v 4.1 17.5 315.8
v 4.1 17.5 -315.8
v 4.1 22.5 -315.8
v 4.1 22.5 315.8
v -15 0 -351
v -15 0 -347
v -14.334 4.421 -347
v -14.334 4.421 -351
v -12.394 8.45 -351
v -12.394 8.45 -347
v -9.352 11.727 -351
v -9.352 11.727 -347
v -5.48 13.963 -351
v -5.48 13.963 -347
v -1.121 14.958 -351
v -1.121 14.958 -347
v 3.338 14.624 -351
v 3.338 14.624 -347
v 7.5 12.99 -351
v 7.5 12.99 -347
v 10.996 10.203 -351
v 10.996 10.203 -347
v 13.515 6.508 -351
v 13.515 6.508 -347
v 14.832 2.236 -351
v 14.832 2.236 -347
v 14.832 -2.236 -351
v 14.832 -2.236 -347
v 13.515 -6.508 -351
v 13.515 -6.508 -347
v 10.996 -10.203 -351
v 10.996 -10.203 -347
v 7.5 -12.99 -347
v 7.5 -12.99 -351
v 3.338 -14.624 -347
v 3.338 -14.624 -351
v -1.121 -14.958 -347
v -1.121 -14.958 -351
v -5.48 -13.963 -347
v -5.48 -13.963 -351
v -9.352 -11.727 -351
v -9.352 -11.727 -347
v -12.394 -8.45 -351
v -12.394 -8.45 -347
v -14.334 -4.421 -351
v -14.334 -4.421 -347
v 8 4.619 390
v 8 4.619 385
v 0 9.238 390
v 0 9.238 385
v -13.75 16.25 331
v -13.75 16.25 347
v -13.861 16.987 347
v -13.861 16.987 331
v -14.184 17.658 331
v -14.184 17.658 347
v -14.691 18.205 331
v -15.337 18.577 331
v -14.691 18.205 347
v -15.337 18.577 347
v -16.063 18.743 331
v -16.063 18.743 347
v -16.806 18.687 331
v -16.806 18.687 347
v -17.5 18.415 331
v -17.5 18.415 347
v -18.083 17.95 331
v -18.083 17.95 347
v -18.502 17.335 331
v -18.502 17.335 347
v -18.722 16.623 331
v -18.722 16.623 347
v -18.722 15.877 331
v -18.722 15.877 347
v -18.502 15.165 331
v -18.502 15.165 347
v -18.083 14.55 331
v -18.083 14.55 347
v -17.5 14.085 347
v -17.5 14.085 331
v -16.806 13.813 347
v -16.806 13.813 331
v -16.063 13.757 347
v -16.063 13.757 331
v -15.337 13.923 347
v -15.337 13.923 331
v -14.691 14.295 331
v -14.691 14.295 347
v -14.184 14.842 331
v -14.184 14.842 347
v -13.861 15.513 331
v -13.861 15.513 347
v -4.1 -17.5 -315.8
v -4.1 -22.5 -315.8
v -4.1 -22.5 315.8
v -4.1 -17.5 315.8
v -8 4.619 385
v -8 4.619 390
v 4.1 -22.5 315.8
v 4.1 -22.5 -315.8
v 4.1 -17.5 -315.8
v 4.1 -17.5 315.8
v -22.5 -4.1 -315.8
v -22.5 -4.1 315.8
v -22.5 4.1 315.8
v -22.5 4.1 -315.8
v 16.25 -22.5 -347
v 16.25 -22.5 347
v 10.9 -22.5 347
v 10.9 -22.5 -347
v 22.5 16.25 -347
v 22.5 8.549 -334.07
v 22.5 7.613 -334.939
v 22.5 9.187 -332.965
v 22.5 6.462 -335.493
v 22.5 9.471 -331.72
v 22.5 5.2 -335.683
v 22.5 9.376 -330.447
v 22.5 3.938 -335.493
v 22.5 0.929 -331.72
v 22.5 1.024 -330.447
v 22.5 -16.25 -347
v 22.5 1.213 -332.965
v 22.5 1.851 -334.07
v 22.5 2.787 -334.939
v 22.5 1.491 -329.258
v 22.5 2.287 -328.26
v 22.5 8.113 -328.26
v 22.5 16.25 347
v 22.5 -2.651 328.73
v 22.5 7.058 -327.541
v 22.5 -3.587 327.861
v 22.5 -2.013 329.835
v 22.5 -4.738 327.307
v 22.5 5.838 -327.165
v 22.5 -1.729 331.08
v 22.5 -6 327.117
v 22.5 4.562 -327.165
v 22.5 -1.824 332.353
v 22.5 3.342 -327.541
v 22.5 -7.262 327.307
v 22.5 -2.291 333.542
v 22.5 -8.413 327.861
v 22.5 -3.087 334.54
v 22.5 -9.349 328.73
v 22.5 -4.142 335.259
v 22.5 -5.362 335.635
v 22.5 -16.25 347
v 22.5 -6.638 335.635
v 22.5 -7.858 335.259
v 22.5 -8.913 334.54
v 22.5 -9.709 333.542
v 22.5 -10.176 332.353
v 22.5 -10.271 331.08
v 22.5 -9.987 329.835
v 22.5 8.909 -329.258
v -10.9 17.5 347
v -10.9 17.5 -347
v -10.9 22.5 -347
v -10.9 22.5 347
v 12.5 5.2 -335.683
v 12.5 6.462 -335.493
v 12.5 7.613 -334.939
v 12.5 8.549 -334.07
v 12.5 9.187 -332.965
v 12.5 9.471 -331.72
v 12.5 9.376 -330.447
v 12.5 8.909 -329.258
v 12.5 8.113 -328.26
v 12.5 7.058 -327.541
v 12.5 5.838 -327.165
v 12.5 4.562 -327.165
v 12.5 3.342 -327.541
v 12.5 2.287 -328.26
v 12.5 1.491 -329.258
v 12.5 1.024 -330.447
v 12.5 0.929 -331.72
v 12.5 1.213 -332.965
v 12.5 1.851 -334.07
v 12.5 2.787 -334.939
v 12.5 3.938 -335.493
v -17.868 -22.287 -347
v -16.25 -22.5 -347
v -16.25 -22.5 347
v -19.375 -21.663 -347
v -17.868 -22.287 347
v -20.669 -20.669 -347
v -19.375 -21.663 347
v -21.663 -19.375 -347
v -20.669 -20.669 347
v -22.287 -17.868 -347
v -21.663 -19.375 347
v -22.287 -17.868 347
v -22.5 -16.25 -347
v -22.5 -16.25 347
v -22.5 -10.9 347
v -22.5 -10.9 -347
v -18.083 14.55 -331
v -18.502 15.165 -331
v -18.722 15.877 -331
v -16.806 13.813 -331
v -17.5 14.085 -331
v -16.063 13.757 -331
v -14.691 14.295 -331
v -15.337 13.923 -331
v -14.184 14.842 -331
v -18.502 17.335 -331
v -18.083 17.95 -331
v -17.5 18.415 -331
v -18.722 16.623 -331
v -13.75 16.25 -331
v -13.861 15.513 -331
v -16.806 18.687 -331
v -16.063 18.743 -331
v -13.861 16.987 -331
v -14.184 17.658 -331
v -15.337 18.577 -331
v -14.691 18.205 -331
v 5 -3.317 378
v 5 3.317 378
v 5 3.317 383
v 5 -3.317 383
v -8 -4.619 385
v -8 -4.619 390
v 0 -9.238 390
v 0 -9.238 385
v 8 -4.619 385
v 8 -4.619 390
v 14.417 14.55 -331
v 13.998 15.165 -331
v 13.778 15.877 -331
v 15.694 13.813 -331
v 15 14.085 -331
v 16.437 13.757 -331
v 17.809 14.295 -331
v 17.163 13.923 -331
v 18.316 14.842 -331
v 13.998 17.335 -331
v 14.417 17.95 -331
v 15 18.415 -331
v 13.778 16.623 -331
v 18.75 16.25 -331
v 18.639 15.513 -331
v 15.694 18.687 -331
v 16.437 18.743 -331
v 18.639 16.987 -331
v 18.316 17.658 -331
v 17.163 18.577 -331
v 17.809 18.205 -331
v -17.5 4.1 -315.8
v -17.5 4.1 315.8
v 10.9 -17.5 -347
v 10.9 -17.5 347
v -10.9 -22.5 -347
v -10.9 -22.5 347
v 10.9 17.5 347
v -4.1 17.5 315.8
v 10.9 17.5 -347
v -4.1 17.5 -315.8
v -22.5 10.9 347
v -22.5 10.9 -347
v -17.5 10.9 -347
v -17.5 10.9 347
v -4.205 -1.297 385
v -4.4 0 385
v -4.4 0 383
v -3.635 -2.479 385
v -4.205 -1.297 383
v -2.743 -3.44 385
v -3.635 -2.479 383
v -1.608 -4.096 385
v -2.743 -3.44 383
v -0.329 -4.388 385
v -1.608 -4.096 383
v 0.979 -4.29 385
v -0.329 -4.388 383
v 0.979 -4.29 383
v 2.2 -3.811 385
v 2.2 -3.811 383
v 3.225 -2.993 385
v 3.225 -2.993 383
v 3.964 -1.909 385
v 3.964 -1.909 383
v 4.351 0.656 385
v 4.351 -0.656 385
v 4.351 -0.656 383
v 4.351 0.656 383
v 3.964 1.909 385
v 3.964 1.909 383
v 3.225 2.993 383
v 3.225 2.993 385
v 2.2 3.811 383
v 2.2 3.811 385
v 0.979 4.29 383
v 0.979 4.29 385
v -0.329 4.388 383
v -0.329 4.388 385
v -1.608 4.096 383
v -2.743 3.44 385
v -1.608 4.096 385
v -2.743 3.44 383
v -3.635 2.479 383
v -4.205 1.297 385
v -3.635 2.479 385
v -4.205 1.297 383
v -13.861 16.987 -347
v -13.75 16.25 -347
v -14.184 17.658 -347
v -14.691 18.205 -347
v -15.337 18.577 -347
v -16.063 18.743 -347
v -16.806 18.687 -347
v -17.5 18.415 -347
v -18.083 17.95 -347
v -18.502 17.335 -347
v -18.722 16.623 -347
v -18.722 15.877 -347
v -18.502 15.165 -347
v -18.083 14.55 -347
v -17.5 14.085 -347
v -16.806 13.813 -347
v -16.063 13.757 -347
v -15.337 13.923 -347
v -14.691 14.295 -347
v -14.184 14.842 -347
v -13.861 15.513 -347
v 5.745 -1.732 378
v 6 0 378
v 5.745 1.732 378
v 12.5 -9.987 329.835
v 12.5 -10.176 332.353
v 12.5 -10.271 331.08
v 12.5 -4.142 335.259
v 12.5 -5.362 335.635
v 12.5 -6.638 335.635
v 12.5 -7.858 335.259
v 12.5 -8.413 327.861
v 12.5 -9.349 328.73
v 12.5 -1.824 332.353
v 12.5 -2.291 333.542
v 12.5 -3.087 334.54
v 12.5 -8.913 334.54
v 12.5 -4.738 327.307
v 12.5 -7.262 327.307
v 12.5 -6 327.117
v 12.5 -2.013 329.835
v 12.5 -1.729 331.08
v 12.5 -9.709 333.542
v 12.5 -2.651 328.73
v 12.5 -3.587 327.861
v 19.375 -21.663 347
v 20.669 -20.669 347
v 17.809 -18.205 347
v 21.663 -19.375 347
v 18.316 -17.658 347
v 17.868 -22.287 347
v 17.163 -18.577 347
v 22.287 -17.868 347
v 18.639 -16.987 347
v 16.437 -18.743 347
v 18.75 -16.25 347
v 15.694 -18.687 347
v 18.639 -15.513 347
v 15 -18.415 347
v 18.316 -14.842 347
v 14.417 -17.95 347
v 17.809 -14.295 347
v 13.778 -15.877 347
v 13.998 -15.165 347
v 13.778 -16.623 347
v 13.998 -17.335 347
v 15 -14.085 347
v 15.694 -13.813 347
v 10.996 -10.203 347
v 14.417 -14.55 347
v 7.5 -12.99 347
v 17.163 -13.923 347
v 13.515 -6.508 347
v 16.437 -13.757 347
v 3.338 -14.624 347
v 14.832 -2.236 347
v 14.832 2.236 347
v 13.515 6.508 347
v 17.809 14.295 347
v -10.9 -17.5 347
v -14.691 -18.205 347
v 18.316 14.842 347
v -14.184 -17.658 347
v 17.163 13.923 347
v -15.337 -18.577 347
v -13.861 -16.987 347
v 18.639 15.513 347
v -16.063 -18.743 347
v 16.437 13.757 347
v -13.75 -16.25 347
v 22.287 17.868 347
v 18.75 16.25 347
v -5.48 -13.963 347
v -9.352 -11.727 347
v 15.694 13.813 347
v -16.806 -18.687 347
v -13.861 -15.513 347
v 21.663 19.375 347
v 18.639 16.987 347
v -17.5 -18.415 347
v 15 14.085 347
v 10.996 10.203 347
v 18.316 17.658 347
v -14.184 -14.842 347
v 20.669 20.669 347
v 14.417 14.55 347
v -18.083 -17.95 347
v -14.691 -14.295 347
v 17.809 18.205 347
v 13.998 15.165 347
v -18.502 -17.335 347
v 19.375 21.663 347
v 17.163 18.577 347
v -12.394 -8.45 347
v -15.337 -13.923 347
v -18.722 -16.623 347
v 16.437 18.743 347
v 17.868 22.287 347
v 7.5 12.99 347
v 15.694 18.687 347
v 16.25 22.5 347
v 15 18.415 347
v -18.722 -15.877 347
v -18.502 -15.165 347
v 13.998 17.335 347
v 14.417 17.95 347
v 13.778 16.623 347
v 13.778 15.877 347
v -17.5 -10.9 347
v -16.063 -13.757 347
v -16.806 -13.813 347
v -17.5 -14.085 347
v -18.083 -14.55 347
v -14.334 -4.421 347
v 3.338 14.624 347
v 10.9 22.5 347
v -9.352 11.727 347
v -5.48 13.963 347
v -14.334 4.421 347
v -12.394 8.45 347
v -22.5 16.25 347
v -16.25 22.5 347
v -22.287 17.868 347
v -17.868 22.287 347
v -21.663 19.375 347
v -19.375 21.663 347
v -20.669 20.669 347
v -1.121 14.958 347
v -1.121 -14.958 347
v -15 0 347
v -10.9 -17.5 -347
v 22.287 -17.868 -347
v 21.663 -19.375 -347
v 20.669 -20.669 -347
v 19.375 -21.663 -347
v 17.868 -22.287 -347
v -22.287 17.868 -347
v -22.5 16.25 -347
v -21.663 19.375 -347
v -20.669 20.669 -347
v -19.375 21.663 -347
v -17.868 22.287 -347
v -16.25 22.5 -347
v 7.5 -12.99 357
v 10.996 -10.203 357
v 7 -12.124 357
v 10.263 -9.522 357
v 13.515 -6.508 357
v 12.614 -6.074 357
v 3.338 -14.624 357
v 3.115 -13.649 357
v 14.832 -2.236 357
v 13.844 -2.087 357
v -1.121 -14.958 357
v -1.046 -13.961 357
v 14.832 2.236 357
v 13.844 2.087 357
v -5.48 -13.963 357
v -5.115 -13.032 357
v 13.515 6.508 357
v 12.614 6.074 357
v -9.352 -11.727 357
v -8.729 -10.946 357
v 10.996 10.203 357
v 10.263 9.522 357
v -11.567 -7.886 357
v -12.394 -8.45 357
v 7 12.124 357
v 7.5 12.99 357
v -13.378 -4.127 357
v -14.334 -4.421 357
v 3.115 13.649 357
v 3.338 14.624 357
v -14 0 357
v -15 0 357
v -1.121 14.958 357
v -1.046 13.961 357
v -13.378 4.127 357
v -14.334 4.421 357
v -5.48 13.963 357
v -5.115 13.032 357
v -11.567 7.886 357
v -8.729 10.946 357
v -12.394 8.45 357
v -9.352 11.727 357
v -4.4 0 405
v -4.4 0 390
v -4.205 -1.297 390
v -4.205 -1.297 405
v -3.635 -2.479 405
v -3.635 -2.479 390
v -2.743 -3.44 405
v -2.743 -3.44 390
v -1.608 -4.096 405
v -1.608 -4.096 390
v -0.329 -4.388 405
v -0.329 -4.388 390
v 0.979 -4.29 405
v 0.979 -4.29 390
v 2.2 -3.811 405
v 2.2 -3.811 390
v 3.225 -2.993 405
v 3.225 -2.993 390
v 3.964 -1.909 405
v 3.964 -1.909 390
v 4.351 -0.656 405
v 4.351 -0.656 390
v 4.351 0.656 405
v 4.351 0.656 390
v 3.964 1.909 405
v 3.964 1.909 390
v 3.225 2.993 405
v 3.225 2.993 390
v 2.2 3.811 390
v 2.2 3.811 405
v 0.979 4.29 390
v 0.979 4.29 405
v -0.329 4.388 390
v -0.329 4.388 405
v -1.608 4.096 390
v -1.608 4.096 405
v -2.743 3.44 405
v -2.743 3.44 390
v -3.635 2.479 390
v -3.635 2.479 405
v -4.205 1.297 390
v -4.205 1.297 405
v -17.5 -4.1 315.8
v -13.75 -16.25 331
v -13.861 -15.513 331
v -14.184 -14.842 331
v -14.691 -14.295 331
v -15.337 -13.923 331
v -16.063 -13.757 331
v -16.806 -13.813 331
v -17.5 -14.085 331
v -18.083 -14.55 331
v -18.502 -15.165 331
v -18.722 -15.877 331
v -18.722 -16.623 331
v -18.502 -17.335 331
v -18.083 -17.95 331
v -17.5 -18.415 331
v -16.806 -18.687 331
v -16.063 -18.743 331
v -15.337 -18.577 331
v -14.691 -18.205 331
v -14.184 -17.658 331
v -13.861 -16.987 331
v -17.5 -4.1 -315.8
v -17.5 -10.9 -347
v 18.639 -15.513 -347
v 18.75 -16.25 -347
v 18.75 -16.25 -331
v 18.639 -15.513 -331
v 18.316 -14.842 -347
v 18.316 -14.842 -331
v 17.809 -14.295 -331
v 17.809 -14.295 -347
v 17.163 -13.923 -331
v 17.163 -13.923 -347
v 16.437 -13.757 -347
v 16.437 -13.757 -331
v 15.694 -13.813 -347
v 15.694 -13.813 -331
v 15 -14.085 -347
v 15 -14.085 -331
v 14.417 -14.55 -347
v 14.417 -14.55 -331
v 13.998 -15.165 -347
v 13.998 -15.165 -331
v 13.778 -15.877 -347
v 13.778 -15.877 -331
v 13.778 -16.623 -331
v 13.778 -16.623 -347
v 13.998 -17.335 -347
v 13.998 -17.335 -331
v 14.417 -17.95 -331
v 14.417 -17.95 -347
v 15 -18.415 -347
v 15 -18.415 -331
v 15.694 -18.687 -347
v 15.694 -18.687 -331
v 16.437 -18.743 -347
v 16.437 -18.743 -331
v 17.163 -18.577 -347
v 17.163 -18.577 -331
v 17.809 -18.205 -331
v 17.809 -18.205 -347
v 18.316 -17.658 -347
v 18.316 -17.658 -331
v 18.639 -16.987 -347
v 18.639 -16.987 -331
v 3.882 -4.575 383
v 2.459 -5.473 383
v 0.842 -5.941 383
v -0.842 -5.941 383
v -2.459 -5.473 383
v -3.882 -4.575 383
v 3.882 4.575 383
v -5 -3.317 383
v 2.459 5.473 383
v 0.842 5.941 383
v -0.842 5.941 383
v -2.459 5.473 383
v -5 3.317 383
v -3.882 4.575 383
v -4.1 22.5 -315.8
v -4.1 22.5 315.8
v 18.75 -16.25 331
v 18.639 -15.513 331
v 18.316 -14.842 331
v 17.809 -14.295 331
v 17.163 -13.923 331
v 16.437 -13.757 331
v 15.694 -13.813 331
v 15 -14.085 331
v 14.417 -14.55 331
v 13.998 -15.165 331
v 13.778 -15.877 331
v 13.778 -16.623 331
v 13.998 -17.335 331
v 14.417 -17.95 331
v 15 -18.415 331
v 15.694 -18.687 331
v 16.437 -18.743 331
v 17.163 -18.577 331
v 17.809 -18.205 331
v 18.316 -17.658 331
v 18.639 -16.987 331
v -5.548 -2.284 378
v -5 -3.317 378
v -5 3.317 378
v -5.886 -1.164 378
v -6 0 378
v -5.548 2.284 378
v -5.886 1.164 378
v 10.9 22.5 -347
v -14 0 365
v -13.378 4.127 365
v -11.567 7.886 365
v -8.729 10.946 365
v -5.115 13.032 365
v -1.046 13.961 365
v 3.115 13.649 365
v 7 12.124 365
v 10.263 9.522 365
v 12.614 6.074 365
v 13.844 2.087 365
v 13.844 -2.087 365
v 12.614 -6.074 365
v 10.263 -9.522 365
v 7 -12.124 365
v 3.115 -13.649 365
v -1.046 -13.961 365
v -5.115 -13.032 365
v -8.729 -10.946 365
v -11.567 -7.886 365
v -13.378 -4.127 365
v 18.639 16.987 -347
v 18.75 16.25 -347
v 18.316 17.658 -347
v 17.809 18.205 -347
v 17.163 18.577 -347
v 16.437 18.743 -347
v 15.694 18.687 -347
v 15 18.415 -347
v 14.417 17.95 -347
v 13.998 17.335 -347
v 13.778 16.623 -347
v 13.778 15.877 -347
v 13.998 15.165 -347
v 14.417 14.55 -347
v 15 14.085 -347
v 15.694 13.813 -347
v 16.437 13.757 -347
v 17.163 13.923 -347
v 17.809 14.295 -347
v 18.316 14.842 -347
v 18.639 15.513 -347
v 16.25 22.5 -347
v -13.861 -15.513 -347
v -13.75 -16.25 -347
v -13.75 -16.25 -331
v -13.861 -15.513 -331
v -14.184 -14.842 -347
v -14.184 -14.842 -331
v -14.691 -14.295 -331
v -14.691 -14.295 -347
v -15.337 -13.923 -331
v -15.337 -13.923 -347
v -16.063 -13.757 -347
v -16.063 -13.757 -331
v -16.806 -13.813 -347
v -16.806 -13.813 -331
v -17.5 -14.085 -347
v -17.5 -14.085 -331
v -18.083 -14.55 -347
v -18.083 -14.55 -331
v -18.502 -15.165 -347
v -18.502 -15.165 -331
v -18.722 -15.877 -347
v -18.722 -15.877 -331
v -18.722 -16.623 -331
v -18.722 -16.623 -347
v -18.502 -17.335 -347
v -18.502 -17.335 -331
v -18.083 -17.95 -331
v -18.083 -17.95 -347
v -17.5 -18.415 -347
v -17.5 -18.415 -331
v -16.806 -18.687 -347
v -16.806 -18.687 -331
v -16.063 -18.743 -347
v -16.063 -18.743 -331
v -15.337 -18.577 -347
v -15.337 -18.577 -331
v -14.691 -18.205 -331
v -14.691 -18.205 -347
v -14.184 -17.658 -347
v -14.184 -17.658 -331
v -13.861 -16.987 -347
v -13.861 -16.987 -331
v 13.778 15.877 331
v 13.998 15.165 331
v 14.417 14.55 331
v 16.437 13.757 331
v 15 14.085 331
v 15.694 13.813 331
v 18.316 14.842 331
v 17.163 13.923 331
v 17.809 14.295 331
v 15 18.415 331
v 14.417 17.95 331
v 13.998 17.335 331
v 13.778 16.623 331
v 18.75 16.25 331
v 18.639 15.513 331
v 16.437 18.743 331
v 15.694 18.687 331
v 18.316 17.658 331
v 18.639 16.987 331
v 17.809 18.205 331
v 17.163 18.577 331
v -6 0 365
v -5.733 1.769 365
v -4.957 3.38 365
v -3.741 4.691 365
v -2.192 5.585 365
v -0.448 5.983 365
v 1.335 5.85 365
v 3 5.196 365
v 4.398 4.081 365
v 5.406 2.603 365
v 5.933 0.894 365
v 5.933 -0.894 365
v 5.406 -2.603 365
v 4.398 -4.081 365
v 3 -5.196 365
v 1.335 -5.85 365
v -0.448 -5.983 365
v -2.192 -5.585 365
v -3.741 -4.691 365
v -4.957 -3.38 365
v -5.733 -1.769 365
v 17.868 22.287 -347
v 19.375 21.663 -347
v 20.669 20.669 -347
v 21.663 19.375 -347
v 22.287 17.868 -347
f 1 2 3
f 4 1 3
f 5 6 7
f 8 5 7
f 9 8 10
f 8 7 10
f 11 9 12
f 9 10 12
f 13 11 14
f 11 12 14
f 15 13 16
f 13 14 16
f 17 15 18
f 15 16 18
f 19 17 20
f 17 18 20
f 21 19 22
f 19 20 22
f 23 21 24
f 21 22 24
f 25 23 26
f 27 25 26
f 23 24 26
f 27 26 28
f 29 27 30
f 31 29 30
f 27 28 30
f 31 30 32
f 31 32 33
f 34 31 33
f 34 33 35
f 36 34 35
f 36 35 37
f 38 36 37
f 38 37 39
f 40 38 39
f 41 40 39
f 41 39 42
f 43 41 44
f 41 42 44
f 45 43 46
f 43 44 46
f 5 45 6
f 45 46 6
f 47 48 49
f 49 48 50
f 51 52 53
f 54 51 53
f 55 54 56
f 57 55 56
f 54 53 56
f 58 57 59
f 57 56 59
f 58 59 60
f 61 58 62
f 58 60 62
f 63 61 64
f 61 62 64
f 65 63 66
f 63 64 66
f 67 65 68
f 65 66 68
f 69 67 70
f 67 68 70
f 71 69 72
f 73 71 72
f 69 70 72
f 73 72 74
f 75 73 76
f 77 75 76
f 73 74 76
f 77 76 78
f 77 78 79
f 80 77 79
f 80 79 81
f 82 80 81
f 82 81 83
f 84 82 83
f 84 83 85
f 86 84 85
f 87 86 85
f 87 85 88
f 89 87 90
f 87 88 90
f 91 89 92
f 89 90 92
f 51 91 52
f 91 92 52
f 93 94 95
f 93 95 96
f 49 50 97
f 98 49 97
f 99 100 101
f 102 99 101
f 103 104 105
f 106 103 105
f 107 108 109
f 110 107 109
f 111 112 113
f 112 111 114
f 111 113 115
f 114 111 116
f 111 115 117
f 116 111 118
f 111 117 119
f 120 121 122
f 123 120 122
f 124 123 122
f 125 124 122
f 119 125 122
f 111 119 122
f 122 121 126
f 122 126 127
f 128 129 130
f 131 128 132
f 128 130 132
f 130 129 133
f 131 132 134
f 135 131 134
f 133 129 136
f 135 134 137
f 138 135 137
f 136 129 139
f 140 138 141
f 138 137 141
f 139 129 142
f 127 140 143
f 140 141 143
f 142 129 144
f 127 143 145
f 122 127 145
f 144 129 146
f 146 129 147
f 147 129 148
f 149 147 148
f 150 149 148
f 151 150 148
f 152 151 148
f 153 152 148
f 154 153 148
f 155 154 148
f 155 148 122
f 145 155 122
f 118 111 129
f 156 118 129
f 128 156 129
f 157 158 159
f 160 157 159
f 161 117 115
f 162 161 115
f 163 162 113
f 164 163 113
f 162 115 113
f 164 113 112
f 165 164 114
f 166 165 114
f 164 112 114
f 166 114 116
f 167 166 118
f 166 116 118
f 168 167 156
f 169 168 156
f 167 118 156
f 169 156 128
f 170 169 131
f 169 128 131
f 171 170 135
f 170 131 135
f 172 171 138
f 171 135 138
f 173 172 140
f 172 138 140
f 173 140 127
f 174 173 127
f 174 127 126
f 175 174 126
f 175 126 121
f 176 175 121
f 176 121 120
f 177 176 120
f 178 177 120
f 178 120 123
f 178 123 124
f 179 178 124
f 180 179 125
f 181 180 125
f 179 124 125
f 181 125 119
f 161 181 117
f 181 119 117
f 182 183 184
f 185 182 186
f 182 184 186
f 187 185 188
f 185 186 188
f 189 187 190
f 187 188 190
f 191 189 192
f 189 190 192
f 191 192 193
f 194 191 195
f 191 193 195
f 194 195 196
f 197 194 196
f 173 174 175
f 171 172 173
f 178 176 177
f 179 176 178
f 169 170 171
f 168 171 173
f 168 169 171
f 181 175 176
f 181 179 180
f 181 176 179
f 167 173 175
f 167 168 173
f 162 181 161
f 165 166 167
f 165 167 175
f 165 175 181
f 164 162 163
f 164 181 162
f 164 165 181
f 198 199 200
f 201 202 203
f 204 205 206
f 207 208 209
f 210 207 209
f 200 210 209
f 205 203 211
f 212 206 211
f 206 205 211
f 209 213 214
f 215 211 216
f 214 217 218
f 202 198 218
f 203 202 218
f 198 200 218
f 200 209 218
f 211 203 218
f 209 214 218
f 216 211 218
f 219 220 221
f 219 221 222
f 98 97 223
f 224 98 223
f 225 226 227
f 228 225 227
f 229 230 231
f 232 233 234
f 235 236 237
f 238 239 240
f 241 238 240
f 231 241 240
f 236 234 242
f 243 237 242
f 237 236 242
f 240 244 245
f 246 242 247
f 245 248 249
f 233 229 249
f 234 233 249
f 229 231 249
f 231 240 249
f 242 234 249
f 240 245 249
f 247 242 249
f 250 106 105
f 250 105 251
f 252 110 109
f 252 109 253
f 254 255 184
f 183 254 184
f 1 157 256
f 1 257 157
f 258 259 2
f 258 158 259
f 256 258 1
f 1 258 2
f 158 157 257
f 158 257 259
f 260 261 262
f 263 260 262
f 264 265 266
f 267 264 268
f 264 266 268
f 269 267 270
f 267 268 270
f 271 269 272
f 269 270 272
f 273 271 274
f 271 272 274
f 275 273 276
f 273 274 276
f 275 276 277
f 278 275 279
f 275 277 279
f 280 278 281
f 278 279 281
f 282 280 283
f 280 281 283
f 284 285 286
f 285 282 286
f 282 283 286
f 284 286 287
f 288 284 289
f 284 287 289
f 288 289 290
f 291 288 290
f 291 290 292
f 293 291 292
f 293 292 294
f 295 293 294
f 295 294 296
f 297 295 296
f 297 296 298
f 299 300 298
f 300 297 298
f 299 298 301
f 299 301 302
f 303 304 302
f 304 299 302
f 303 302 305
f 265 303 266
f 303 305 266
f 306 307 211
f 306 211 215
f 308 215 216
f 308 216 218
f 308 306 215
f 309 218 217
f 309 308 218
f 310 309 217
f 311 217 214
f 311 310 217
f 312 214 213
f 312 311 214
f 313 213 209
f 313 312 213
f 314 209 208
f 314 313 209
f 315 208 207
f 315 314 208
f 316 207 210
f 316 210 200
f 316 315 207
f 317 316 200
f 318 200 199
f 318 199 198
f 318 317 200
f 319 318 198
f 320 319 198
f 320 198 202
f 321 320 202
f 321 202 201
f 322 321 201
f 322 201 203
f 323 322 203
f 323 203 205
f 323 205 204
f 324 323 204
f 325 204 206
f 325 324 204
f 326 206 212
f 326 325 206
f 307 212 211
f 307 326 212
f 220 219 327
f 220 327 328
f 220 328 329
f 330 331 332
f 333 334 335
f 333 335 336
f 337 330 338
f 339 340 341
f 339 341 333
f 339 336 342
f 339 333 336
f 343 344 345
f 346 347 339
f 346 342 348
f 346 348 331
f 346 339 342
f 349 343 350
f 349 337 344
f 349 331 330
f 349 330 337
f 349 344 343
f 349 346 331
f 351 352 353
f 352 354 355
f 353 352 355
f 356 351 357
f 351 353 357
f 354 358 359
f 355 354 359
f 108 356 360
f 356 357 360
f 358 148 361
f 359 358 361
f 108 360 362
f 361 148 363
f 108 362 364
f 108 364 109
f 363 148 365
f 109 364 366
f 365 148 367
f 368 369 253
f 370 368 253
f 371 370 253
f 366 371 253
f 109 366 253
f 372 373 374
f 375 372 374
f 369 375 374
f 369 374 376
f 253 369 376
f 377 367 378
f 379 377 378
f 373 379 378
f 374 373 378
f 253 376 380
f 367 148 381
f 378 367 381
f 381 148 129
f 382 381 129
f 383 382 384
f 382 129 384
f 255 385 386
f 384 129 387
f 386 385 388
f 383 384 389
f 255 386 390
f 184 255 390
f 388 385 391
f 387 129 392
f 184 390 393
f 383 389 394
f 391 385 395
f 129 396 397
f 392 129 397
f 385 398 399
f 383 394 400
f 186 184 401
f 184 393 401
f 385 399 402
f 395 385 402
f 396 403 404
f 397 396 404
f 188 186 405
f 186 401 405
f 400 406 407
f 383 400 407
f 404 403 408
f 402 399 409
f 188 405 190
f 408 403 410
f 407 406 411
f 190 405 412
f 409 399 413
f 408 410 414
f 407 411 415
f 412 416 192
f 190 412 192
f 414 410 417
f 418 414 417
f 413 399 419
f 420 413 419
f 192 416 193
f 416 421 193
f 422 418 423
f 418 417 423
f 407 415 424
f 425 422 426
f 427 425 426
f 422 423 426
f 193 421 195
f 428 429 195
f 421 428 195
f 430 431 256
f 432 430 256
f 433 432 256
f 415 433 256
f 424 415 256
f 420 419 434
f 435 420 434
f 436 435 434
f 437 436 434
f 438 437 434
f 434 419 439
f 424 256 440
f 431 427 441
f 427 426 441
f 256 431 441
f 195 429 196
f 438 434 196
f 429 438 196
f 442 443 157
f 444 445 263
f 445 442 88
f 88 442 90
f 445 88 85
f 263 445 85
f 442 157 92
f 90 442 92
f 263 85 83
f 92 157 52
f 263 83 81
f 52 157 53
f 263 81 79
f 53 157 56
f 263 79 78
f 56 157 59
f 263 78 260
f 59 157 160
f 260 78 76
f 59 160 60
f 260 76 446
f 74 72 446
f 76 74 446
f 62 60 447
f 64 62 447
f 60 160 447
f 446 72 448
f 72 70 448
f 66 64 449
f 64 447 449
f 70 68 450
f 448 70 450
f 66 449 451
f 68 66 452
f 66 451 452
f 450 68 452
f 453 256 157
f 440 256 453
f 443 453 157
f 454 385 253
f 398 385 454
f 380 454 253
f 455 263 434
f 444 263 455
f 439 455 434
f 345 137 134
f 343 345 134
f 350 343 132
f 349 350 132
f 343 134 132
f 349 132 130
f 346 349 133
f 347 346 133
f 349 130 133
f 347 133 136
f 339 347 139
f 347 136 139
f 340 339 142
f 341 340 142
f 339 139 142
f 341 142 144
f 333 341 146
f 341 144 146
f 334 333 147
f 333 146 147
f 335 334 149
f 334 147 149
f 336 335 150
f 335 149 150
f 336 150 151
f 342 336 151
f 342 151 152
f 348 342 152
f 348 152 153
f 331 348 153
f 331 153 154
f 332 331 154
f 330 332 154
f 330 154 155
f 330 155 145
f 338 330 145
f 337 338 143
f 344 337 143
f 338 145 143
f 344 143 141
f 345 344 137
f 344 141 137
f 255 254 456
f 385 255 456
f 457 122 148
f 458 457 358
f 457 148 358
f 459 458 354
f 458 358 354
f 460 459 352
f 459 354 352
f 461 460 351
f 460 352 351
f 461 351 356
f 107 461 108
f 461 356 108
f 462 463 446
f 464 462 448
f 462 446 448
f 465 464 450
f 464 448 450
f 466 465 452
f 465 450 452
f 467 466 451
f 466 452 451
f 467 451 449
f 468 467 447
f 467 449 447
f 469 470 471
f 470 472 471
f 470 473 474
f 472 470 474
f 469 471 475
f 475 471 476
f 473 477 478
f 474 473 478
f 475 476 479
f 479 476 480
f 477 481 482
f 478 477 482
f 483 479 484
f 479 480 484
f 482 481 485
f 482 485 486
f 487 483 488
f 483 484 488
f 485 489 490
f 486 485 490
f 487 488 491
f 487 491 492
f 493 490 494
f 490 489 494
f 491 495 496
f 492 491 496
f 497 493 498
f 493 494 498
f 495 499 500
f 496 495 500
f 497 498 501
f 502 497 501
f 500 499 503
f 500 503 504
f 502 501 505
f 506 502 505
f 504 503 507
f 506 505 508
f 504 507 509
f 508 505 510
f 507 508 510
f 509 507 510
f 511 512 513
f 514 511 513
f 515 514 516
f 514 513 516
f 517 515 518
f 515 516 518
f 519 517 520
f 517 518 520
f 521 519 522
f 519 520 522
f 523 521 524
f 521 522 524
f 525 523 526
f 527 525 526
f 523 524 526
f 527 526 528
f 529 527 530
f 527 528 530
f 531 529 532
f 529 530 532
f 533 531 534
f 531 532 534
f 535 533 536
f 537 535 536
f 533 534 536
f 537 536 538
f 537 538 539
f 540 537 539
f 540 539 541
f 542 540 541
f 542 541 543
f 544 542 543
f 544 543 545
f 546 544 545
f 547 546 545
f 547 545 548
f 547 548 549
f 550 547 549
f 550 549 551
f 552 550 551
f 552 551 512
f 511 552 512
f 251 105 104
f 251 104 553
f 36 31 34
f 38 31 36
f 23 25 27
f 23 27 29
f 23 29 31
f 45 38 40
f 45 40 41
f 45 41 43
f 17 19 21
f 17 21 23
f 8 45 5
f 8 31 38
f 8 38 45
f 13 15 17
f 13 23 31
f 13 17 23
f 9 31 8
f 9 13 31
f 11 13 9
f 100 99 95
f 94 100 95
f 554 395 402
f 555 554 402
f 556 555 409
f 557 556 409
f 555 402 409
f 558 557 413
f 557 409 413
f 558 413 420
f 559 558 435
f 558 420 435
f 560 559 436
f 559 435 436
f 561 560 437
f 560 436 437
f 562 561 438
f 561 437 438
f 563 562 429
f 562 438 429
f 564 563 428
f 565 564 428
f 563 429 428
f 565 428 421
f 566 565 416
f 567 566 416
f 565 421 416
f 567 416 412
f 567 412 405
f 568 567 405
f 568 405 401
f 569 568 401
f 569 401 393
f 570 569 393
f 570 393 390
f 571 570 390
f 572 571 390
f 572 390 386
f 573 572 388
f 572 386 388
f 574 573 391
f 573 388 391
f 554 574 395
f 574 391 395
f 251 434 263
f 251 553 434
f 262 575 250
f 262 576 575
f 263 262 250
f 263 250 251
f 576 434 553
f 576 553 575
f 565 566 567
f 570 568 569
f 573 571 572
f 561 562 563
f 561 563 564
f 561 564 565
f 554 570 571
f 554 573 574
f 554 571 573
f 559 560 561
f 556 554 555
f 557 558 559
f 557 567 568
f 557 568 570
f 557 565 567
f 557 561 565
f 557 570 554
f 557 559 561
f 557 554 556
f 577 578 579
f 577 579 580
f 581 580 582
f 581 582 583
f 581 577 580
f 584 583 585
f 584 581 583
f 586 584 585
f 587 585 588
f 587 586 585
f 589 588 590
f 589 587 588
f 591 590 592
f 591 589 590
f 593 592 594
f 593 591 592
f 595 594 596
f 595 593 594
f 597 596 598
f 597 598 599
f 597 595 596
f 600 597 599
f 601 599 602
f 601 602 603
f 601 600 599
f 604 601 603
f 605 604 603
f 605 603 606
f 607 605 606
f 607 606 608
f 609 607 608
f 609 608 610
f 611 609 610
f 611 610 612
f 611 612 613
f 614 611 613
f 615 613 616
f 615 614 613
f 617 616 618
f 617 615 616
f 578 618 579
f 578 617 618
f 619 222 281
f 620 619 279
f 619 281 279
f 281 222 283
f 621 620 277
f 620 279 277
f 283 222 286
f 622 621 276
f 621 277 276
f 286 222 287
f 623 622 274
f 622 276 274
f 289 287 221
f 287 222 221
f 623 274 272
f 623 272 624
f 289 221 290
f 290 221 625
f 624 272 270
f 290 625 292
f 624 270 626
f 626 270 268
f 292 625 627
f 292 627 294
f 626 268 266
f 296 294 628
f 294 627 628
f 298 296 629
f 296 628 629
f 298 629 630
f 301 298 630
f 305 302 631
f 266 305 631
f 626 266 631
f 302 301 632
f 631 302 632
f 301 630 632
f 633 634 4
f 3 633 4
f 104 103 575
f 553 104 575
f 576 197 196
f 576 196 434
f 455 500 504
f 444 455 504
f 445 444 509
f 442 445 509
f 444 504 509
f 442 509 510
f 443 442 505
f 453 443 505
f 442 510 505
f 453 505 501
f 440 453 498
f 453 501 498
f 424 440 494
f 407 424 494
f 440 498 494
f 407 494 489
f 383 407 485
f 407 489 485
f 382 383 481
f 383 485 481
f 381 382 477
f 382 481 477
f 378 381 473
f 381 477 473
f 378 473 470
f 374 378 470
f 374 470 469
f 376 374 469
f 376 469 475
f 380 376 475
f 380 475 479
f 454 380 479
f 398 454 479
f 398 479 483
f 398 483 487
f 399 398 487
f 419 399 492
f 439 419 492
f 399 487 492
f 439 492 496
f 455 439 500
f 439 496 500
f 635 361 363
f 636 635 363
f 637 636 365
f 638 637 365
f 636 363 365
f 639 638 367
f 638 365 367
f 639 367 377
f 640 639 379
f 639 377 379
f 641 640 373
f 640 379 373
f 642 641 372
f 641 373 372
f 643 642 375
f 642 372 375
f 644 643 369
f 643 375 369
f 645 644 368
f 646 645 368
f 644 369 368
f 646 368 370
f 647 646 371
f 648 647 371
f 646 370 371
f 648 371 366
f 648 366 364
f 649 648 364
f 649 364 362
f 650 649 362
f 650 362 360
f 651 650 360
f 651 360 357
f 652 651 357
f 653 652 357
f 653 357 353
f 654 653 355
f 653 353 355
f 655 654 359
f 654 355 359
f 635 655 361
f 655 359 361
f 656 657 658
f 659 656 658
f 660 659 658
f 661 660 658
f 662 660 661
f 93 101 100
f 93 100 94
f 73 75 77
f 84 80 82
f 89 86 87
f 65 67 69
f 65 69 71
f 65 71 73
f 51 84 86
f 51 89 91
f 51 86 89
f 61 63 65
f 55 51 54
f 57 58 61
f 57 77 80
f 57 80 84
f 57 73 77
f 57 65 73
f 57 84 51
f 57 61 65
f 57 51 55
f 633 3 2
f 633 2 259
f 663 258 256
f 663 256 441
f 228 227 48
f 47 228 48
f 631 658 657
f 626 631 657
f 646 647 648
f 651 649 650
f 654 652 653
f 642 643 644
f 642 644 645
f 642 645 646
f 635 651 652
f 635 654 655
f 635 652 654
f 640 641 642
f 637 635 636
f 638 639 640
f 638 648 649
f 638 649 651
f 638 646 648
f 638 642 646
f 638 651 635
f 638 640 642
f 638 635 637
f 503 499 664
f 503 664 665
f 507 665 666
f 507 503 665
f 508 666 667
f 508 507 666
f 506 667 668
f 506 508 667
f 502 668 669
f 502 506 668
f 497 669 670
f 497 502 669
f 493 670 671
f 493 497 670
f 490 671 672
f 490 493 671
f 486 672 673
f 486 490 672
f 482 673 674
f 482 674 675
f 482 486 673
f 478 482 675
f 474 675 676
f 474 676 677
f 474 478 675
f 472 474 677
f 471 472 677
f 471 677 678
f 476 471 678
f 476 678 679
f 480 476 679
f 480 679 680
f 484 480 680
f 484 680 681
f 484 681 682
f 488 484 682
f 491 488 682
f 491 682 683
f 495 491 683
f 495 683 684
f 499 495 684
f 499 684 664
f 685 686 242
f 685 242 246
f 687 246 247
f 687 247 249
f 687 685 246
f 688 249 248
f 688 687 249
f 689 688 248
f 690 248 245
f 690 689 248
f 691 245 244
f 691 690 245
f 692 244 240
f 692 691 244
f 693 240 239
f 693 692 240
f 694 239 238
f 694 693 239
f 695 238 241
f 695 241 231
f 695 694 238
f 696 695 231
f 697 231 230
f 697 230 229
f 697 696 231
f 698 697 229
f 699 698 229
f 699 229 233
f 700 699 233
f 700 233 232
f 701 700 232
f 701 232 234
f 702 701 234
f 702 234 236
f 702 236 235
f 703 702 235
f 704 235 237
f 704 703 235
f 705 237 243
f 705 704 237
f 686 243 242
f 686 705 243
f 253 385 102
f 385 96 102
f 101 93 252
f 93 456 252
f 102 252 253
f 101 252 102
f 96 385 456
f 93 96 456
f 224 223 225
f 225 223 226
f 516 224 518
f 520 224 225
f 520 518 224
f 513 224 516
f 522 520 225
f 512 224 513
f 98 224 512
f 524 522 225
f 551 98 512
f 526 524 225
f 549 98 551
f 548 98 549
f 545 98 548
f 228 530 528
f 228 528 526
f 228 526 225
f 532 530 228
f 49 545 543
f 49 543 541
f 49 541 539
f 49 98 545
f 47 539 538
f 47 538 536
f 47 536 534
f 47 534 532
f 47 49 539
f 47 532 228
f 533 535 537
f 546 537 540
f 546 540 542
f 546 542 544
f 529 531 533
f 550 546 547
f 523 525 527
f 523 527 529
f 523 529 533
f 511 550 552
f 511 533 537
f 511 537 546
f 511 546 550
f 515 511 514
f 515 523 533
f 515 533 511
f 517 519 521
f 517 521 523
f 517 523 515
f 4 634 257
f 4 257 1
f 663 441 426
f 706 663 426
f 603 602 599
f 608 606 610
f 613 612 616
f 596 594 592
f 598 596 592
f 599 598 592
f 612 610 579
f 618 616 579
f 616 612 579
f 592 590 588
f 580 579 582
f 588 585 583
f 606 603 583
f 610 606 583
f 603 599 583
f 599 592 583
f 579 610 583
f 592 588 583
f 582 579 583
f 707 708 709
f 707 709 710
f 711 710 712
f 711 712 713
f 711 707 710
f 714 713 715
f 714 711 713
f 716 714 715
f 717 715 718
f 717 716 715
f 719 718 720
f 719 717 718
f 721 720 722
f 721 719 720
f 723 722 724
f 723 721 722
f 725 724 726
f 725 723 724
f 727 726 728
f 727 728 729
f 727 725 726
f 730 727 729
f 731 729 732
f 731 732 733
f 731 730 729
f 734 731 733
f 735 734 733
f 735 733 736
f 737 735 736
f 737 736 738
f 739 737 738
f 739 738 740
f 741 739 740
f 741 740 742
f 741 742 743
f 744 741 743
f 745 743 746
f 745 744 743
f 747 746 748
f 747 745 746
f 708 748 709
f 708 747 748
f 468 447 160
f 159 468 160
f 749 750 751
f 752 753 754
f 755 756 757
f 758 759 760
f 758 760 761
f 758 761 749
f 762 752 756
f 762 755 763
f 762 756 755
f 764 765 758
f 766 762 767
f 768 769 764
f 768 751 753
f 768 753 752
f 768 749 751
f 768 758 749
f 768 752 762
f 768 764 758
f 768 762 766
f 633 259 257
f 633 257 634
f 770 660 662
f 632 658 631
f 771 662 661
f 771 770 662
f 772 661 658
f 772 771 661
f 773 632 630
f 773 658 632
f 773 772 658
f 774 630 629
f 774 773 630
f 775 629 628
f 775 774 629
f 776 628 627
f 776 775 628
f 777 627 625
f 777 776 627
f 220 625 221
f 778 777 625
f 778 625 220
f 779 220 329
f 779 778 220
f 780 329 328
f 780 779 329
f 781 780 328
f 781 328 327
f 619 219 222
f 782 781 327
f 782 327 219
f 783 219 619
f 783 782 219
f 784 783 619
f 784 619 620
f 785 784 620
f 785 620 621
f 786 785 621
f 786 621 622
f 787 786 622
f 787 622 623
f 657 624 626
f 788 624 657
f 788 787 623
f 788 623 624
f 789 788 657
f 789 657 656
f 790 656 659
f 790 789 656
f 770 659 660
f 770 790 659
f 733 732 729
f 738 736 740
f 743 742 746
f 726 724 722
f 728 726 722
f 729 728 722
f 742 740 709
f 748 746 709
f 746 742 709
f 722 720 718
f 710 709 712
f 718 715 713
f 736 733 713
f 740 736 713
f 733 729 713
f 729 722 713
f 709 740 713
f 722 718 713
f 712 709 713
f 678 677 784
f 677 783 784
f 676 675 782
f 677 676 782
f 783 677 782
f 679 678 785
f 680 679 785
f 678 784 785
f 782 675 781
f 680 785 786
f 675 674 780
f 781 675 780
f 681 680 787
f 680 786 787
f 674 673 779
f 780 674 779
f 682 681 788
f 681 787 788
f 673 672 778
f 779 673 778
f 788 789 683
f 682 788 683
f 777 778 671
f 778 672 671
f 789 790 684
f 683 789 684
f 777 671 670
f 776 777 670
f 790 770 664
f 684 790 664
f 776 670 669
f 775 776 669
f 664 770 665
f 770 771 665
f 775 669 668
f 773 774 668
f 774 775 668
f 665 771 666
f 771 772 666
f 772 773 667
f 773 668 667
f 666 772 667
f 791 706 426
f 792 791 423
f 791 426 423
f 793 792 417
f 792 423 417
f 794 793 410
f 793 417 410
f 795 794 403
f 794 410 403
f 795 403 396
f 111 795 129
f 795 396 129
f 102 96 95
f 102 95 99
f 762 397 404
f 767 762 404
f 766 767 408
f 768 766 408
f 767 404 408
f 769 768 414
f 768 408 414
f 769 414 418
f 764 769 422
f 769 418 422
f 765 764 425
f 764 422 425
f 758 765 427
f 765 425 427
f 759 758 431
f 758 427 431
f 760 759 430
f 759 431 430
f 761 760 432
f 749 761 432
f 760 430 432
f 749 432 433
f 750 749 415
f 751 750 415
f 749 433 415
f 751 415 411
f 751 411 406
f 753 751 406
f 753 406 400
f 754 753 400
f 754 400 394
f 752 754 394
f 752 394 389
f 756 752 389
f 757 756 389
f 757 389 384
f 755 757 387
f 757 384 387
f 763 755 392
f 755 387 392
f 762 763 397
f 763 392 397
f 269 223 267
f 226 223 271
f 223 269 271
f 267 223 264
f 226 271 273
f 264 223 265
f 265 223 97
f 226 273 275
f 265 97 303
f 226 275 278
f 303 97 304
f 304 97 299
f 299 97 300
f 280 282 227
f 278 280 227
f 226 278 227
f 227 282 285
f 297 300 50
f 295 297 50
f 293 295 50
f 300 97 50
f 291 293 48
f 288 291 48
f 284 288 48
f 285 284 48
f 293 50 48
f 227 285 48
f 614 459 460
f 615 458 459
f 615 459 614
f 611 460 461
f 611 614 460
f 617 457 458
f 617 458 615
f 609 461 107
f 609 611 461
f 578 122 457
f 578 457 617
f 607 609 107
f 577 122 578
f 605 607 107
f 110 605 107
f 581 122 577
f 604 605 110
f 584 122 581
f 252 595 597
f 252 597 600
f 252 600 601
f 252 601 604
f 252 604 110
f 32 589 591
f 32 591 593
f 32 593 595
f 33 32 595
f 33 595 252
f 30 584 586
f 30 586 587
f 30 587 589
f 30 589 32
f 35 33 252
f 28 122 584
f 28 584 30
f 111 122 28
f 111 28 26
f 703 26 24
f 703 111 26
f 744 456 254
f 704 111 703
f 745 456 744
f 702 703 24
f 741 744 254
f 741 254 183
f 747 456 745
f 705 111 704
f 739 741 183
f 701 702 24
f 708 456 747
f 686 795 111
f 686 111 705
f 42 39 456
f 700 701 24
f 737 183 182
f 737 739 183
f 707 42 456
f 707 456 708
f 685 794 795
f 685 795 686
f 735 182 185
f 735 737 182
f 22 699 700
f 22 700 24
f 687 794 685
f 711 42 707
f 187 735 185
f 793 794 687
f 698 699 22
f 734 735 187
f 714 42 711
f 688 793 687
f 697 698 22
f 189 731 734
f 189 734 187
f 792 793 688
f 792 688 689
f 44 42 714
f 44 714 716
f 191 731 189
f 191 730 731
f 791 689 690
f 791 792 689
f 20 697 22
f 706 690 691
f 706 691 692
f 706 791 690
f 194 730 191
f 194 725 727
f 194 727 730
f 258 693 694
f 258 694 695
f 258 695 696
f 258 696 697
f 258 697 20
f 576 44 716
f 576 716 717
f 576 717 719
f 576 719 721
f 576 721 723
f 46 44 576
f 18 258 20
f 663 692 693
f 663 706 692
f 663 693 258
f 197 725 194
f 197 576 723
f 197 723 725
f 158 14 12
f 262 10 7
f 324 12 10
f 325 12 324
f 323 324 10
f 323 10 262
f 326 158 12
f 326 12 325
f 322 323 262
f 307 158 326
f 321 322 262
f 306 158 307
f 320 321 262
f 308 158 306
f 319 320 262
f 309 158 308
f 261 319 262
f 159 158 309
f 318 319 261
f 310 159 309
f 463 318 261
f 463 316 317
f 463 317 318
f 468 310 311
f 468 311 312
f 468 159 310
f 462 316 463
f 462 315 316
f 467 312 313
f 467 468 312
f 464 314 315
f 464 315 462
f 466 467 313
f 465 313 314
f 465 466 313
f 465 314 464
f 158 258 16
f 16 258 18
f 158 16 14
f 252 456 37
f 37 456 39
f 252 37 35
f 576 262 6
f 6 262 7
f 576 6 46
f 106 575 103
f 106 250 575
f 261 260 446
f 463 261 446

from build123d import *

# Parameters (mm, degrees)
BODY_DEPTH         = 347
SK_FRONT_TAPS_R    = 2.5
FRONT_TAPS_DEPTH   = 16
SK_PORTS_R         = 4.283
PORTS_DEPTH        = 10
SK_BACK_PLATE_R    = 15
BACK_PLATE_DEPTH   = 4
FRONT_START        = -10
SK_FRONT_PLATE_R   = 15
FRONT_PLATE_DEPTH  = 10
SK_ROD_HOLDER_R    = 14
ROD_HOLDER_DEPTH   = 18
SK_ROD_R           = 6
ROD_DEPTH          = 730
SK_ROD_THREAD_R    = 4.4
ROD_THREAD_DEPTH   = 22
ROD_START          = -5
ROD_FLATS_DEPTH    = 5
SENSOR_START       = -631.6
SK_SENSOR_SLOT_W   = 6.8
SK_SENSOR_SLOT_H   = 5
SK_SENSOR_SLOT_W_2 = 5
SK_SENSOR_SLOT_H_2 = 6.8
SENSOR_SLOT_DEPTH  = 631.6
FRONT_CUT_REACH    = 669.559
SK_FRONT_CUT_W     = 21.8
SK_FRONT_CUT_H     = 5
SK_FRONT_CUT_W_2   = 5
SK_FRONT_CUT_H_2   = 21.8
BACK_CUT_REACH     = 723.502
SK_BACK_CUT_W      = 21.8
SK_BACK_CUT_H      = 5
SK_BACK_CUT_W_2    = 5
SK_BACK_CUT_H_2    = 21.8
ROD_NUT_DEPTH      = 5


with BuildPart() as part:
    # sk Body → Body (new, symmetric)
    with BuildSketch(Plane.XY):
        with BuildLine():
            Line((-16.25, 22.5), (16.25, 22.5))
            ThreePointArc((16.25, 22.5), (20.669417382, 20.669417382), (22.5, 16.25))
            Line((22.5, 16.25), (22.5, -16.25))
            ThreePointArc((22.5, -16.25), (20.669417382, -20.669417382), (16.25, -22.5))
            Line((16.25, -22.5), (-16.25, -22.5))
            ThreePointArc((-16.25, -22.5), (-20.669417382, -20.669417382), (-22.5, -16.25))
            Line((-22.5, -16.25), (-22.5, 16.25))
            ThreePointArc((-22.5, 16.25), (-20.669417382, 20.669417382), (-16.25, 22.5))
        make_face()
    extrude(amount=BODY_DEPTH, both=True)

    # sk Front Taps → Front Taps (cut)
    with BuildSketch(Plane.XY.offset(347)):
        with Locations((16.25, 16.25)):
            Circle(SK_FRONT_TAPS_R)
        with Locations((-16.25, 16.25)):
            Circle(SK_FRONT_TAPS_R)
        with Locations((-16.25, -16.25)):
            Circle(SK_FRONT_TAPS_R)
        with Locations((16.25, -16.25)):
            Circle(SK_FRONT_TAPS_R)
    front_taps = extrude(amount=-FRONT_TAPS_DEPTH, mode=Mode.SUBTRACT)

    # Back Taps: Front Taps across plane
    add(front_taps.mirror(Plane.XY), mode=Mode.SUBTRACT)

    # sk Ports → Ports (cut)
    with BuildSketch(Plane(origin=(22.5, 0, 0), x_dir=(0, 0, -1), z_dir=(1, 0, 0))):
        with Locations((-331.4, -6)):
            Circle(SK_PORTS_R)
        with Locations((331.4, 5.2)):
            Circle(SK_PORTS_R)
    extrude(amount=-PORTS_DEPTH, mode=Mode.SUBTRACT)

    # sk Back Plate → Back Plate (add)
    with BuildSketch(Plane(origin=(0, 0, -347), x_dir=(-1, 0, 0), z_dir=(0, 0, -1))):
        Circle(SK_BACK_PLATE_R)
    extrude(amount=BACK_PLATE_DEPTH)

    # sk Front Plate → Front Plate (add)
    with BuildSketch(Plane(origin=(0, 0, 347), x_dir=(-1, 0, 0), z_dir=(0, 0, -1)).offset(FRONT_START)):
        Circle(SK_FRONT_PLATE_R)
    extrude(amount=FRONT_PLATE_DEPTH)

    # sk Rod Holder → Rod Holder (add)
    with BuildSketch(Plane(origin=(0, 0, 347), x_dir=(-1, 0, 0), z_dir=(0, 0, -1))):
        Circle(SK_ROD_HOLDER_R)
    extrude(amount=-ROD_HOLDER_DEPTH)

    # sk Rod → Rod (add)
    with BuildSketch(Plane(origin=(0, 0, -347), x_dir=(-1, 0, 0), z_dir=(0, 0, -1))):
        Circle(SK_ROD_R)
    extrude(amount=-ROD_DEPTH)

    # sk Rod Thread → Rod Thread (add)
    with BuildSketch(Plane.XY.offset(383)):
        with Locations(Location((0, 0, 0), (0, 0, 180))):
            Circle(SK_ROD_THREAD_R)
    extrude(amount=ROD_THREAD_DEPTH)

    # sk Rod Flats → Rod Flats (cut)
    with BuildSketch(Plane.XY.offset(383).offset(ROD_START)):
        with BuildLine():
            Line((-5, 3.31662479), (-5, -3.31662479))
            ThreePointArc((-5, -3.31662479), (-6, 0), (-5, 3.31662479))
        make_face()
        with BuildLine():
            Line((5, 3.31662479), (5, -3.31662479))
            ThreePointArc((5, -3.31662479), (6, 0), (5, 3.31662479))
        make_face()
    extrude(amount=ROD_FLATS_DEPTH, mode=Mode.SUBTRACT)

    # sk Sensor Slot → Sensor Slot (cut)
    with BuildSketch(Plane.XY.offset(315.8).offset(SENSOR_START)):
        with Locations((-7.5, 20)):
            Rectangle(SK_SENSOR_SLOT_W, SK_SENSOR_SLOT_H)
        with Locations((7.5, 20)):
            Rectangle(SK_SENSOR_SLOT_W, SK_SENSOR_SLOT_H)
        with Locations((7.5, -20)):
            Rectangle(SK_SENSOR_SLOT_W, SK_SENSOR_SLOT_H)
        with Locations((-7.5, -20)):
            Rectangle(SK_SENSOR_SLOT_W, SK_SENSOR_SLOT_H)
        with Locations((-20, -7.5)):
            Rectangle(SK_SENSOR_SLOT_W_2, SK_SENSOR_SLOT_H_2)
        with Locations((-20, 7.5)):
            Rectangle(SK_SENSOR_SLOT_W_2, SK_SENSOR_SLOT_H_2)
    extrude(amount=SENSOR_SLOT_DEPTH, mode=Mode.SUBTRACT)

    # sk Front Cut → Front Cut (cut, up to next)
    with BuildSketch(Plane.XY.offset(315.8), mode=Mode.PRIVATE) as front_cut_sk1:
        with Locations((0, 20)):
            Rectangle(SK_FRONT_CUT_W, SK_FRONT_CUT_H)
    front_cut_tool1 = extrude(front_cut_sk1.sketch, amount=FRONT_CUT_REACH, mode=Mode.PRIVATE) & part.part
    # sk Front Cut → Front Cut (cut, up to next)
    with BuildSketch(Plane.XY.offset(315.8), mode=Mode.PRIVATE) as front_cut_sk2:
        with Locations((-20, 0)):
            Rectangle(SK_FRONT_CUT_W_2, SK_FRONT_CUT_H_2)
    front_cut_tool2 = extrude(front_cut_sk2.sketch, amount=FRONT_CUT_REACH, mode=Mode.PRIVATE) & part.part
    # sk Front Cut → Front Cut (cut, up to next)
    with BuildSketch(Plane.XY.offset(315.8), mode=Mode.PRIVATE) as front_cut_sk3:
        with Locations((0, -20)):
            Rectangle(SK_FRONT_CUT_W, SK_FRONT_CUT_H)
    front_cut_tool3 = extrude(front_cut_sk3.sketch, amount=FRONT_CUT_REACH, mode=Mode.PRIVATE) & part.part
    add(front_cut_tool1.solids().sort_by_distance((0, 20, 315.8))[0], mode=Mode.SUBTRACT)
    add(front_cut_tool2.solids().sort_by_distance((-20, 0, 315.8))[0], mode=Mode.SUBTRACT)
    add(front_cut_tool3.solids().sort_by_distance((0, -20, 315.8))[0], mode=Mode.SUBTRACT)

    # sk Back Cut → Back Cut (cut, up to next)
    with BuildSketch(Plane(origin=(0, 0, -315.8), x_dir=(-1, 0, 0), z_dir=(0, 0, -1)), mode=Mode.PRIVATE) as back_cut_sk1:
        with Locations((0, 20)):
            Rectangle(SK_BACK_CUT_W, SK_BACK_CUT_H)
    back_cut_tool1 = extrude(back_cut_sk1.sketch, amount=BACK_CUT_REACH, mode=Mode.PRIVATE) & part.part
    # sk Back Cut → Back Cut (cut, up to next)
    with BuildSketch(Plane(origin=(0, 0, -315.8), x_dir=(-1, 0, 0), z_dir=(0, 0, -1)), mode=Mode.PRIVATE) as back_cut_sk2:
        with Locations((20, 0)):
            Rectangle(SK_BACK_CUT_W_2, SK_BACK_CUT_H_2)
    back_cut_tool2 = extrude(back_cut_sk2.sketch, amount=BACK_CUT_REACH, mode=Mode.PRIVATE) & part.part
    # sk Back Cut → Back Cut (cut, up to next)
    with BuildSketch(Plane(origin=(0, 0, -315.8), x_dir=(-1, 0, 0), z_dir=(0, 0, -1)), mode=Mode.PRIVATE) as back_cut_sk3:
        with Locations((0, -20)):
            Rectangle(SK_BACK_CUT_W, SK_BACK_CUT_H)
    back_cut_tool3 = extrude(back_cut_sk3.sketch, amount=BACK_CUT_REACH, mode=Mode.PRIVATE) & part.part
    add(back_cut_tool1.solids().sort_by_distance((0, 20, -315.8))[0], mode=Mode.SUBTRACT)
    add(back_cut_tool2.solids().sort_by_distance((-20, 0, -315.8))[0], mode=Mode.SUBTRACT)
    add(back_cut_tool3.solids().sort_by_distance((0, -20, -315.8))[0], mode=Mode.SUBTRACT)

    # sk Rod Nut → Rod Nut (add)
    with BuildSketch(Plane.XY.offset(385)):
        Polygon((0, -9.237604307), (8, -4.618802154), (8, 4.618802154), (0, 9.237604307), (-8, 4.618802154), (-8, -4.618802154), align=None)
    extrude(amount=ROD_NUT_DEPTH)


solid = part.part
